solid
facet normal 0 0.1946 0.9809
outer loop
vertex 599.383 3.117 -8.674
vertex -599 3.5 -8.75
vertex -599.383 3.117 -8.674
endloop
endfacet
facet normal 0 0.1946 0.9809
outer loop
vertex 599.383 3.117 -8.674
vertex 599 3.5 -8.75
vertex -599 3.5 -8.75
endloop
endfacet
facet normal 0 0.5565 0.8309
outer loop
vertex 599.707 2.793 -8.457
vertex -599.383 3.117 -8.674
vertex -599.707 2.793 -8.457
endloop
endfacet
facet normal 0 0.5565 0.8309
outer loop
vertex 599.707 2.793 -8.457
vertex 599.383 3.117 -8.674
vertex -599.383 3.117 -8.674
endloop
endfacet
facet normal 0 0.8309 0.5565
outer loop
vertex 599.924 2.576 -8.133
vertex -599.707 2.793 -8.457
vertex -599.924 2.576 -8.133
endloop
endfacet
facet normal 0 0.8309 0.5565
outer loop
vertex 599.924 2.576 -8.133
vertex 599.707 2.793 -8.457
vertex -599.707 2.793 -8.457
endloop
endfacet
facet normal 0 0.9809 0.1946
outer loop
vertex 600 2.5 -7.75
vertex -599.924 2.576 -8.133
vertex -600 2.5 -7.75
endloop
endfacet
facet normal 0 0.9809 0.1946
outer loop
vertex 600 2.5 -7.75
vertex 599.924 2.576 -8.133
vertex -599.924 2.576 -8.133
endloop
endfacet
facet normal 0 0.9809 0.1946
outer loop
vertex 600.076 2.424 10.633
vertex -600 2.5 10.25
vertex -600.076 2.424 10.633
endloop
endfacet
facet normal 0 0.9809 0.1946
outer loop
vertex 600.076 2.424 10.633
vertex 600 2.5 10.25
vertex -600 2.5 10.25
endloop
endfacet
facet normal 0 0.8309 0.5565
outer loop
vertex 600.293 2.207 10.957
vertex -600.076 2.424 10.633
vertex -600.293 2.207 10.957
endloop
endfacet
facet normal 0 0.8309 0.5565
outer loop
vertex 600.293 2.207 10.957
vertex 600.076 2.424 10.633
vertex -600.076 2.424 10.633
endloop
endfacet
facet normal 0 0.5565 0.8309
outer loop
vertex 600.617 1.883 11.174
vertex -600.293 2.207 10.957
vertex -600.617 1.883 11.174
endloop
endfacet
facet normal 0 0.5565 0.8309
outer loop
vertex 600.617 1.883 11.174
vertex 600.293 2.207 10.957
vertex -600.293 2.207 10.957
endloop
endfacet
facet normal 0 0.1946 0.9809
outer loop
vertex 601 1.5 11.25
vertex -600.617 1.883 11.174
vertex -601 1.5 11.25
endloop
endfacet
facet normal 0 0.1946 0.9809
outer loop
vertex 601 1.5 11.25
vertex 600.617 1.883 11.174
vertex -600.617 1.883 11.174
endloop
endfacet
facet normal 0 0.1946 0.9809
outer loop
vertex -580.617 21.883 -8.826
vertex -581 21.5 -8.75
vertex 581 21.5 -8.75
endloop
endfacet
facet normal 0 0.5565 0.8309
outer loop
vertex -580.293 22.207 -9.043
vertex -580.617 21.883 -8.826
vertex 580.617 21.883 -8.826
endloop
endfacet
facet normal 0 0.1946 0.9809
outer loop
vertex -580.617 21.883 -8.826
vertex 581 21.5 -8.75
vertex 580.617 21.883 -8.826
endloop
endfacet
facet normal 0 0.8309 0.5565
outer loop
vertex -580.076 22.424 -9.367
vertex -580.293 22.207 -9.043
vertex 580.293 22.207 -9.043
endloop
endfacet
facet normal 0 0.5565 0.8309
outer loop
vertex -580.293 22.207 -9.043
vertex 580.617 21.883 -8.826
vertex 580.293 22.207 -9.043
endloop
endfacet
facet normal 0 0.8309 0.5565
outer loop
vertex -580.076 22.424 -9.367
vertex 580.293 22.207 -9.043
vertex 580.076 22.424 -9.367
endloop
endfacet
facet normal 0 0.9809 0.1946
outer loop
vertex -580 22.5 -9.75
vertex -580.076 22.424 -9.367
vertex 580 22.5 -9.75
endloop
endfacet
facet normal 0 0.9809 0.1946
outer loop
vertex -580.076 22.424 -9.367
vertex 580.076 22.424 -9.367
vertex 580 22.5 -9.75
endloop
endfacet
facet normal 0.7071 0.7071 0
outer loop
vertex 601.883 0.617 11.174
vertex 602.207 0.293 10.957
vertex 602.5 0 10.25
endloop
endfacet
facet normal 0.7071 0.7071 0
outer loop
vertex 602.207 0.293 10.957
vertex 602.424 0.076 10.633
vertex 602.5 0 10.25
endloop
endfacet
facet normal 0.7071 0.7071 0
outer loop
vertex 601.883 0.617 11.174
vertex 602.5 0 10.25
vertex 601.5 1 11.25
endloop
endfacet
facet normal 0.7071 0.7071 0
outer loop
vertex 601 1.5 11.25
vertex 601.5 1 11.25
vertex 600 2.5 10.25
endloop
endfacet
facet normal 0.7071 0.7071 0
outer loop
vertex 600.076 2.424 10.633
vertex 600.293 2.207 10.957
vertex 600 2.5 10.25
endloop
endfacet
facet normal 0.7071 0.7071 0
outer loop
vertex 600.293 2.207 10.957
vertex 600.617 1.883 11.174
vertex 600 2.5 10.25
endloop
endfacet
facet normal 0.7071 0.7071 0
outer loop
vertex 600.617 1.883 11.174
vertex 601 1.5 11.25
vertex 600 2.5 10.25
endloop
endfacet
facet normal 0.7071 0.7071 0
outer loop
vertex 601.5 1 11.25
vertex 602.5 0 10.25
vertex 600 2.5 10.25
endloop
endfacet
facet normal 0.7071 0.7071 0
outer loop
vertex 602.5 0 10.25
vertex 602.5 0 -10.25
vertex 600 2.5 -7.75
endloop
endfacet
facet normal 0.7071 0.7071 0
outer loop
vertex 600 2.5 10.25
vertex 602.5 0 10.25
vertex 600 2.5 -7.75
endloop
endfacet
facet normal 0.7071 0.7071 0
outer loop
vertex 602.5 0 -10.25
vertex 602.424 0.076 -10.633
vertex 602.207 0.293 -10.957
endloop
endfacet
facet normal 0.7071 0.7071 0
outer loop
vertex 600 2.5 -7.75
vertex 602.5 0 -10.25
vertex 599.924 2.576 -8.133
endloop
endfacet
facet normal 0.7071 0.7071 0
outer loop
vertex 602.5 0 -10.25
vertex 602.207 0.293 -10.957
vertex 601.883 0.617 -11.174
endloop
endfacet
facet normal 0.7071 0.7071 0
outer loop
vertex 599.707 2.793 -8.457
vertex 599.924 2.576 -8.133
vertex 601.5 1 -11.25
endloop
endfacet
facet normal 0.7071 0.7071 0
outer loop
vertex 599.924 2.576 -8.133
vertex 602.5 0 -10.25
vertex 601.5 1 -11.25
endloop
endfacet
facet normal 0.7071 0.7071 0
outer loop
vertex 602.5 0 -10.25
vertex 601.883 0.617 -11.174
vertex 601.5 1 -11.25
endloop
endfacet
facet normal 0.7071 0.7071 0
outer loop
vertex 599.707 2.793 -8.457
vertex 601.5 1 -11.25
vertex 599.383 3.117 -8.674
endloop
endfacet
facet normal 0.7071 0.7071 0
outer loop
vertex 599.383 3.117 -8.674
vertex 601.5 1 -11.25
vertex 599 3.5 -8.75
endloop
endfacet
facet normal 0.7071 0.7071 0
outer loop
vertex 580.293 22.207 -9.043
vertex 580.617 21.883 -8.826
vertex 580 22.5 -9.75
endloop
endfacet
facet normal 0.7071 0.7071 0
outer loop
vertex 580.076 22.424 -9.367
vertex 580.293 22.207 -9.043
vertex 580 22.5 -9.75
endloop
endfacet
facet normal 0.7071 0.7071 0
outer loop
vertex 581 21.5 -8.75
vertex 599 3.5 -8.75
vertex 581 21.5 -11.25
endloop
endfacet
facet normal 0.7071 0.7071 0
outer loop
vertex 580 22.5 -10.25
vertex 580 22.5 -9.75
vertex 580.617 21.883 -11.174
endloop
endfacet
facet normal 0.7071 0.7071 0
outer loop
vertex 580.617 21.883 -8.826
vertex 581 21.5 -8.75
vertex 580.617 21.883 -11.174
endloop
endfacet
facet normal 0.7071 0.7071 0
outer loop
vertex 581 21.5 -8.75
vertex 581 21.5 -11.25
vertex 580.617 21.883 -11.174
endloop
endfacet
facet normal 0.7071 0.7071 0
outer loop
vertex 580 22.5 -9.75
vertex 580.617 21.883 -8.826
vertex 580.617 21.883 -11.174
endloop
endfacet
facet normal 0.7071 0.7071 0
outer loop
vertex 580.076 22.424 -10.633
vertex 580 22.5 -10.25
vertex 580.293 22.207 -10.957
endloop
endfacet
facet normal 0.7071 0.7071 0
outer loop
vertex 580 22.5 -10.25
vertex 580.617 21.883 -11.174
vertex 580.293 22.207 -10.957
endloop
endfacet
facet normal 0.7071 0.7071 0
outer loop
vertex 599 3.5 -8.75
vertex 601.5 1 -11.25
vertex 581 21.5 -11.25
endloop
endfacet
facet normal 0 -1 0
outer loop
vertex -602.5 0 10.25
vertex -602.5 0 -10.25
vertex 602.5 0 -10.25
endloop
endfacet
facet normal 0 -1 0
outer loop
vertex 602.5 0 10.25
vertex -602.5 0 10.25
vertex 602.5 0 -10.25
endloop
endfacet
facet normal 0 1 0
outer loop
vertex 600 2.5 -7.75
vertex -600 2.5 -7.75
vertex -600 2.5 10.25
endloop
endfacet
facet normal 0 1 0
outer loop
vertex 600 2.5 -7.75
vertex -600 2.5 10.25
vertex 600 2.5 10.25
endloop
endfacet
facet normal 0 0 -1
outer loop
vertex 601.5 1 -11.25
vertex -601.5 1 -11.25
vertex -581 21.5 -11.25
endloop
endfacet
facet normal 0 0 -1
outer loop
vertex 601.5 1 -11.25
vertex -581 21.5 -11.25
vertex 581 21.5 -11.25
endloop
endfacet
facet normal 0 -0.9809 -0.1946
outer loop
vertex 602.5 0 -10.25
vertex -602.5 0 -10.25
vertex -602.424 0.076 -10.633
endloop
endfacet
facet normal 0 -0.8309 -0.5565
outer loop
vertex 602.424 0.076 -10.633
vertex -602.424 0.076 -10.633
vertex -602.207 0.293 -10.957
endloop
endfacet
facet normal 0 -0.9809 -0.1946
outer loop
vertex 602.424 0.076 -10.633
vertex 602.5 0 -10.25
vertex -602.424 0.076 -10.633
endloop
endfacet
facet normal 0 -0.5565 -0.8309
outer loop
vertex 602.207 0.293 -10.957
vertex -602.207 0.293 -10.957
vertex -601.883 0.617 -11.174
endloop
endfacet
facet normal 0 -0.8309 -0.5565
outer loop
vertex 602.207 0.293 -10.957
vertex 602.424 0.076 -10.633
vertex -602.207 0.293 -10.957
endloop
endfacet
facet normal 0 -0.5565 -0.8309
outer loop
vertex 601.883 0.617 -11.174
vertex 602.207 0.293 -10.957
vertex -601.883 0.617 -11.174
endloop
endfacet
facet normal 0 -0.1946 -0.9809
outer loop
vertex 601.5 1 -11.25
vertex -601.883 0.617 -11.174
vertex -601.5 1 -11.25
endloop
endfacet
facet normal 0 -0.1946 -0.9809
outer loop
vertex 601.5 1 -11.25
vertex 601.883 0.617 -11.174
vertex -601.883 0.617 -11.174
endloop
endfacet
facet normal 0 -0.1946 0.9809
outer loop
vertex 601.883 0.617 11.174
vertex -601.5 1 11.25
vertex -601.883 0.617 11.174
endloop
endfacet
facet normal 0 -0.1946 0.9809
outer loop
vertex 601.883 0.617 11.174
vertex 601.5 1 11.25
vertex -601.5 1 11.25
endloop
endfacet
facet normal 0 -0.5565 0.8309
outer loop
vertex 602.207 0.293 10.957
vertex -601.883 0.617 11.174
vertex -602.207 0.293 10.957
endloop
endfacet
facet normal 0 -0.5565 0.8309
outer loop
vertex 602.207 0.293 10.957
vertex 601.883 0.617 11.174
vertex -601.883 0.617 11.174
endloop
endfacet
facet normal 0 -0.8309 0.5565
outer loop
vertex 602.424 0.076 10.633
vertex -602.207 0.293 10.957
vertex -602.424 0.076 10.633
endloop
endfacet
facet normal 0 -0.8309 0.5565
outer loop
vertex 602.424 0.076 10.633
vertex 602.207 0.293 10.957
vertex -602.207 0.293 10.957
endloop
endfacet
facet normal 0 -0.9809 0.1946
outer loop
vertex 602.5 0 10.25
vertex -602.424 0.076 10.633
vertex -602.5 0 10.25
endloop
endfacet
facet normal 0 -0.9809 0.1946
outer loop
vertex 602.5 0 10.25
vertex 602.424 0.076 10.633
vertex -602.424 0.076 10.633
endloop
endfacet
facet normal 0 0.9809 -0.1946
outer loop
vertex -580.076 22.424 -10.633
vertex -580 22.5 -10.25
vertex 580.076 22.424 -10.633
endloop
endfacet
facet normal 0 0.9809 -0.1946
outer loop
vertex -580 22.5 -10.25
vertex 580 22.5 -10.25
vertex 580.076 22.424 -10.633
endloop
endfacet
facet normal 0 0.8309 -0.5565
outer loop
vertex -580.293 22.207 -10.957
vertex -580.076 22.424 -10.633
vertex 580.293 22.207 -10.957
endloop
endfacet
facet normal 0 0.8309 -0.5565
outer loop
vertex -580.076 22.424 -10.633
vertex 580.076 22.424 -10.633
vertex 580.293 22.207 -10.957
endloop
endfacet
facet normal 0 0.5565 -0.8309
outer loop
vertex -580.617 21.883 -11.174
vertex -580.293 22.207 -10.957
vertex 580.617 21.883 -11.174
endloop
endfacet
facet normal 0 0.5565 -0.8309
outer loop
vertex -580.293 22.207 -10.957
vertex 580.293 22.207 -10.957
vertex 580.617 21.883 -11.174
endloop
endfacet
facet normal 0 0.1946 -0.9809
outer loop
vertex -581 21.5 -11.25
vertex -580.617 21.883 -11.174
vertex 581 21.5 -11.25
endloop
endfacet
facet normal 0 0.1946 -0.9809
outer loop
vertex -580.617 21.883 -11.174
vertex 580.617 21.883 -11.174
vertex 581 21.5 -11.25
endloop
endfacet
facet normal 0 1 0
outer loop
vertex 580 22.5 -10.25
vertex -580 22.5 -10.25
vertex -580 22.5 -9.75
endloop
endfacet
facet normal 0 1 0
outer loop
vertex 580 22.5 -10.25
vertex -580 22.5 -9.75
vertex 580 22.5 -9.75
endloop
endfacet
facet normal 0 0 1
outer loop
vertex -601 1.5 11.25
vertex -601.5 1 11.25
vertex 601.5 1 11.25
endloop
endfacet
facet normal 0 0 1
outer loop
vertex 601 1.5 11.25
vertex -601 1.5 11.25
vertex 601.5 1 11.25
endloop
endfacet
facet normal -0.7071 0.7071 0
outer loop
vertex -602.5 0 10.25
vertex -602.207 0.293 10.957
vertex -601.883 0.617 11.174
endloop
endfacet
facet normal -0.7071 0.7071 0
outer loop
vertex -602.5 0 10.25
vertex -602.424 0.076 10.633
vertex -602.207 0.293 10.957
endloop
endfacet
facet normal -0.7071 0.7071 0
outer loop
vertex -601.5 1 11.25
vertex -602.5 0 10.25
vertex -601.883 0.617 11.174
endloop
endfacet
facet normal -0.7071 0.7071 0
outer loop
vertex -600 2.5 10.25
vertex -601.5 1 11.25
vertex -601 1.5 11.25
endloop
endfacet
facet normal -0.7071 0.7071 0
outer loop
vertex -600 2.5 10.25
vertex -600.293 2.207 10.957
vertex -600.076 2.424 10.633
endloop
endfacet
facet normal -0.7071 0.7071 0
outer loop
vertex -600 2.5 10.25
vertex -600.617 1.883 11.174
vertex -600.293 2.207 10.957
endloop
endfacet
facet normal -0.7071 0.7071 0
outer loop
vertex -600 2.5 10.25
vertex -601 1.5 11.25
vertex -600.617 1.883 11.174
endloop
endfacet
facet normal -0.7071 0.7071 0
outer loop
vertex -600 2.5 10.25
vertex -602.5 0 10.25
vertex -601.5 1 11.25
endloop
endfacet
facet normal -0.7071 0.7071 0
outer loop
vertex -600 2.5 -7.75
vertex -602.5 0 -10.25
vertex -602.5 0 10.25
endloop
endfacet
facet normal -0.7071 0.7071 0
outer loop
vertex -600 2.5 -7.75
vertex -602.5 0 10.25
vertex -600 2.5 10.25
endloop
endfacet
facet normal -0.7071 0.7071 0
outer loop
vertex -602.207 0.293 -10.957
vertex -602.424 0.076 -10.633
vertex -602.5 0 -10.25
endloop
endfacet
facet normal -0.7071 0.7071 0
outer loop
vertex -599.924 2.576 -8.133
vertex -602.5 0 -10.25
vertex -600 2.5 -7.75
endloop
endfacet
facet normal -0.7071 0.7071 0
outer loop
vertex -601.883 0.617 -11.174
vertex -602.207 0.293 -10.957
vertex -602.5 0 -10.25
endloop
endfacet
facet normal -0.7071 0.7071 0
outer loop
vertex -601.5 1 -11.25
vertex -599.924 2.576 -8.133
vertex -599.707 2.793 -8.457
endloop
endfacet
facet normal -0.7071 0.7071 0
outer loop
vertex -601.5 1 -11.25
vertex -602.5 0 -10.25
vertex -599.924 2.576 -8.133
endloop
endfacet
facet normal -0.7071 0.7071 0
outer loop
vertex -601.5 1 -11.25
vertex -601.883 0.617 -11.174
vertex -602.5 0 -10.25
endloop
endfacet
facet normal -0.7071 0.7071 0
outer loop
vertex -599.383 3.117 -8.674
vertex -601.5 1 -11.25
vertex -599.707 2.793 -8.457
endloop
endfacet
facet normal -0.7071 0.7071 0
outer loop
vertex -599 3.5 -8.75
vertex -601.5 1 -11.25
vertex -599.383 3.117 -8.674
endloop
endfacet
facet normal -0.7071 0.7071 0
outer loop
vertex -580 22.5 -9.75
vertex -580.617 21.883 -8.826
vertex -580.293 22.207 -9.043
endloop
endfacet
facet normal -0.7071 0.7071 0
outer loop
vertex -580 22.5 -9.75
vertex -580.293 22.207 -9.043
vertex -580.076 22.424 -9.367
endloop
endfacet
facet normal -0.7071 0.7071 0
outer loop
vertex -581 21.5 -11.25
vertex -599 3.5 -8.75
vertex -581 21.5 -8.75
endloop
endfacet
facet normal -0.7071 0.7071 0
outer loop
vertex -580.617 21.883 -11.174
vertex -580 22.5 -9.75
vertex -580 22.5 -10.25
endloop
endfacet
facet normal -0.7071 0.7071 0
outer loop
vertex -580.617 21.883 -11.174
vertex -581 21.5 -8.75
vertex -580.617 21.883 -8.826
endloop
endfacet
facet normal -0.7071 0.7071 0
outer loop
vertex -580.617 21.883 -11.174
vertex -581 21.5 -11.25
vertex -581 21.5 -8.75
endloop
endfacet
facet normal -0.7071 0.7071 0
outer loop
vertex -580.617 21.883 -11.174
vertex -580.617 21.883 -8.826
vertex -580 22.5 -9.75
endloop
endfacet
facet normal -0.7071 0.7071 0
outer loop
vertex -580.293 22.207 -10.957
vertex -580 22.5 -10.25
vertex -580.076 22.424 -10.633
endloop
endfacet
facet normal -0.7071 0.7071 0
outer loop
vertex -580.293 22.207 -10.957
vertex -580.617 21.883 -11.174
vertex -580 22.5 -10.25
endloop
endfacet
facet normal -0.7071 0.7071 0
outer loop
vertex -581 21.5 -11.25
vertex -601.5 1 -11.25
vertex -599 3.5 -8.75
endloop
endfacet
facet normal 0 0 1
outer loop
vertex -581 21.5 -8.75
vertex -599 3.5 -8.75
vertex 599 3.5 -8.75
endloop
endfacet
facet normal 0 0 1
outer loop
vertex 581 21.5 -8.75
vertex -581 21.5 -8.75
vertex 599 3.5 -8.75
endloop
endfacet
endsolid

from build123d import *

# Parameters (mm, degrees)
SKETCH1_W               = 1220
SKETCH1_H               = 22.5
BOSS_EXTRUDE1_DEPTH     = 2.5
SKETCH2_W               = 1220
SKETCH2_H               = 2.5
BOSS_EXTRUDE2_DEPTH     = 20
CUT_EXTRUDE1_DEPTH      = 611.742376129
CUT_EXTRUDE1_DEPTH_BACK = 25
FILLET2_R               = 1


with BuildPart() as part:
    # Sketch1 → Boss-Extrude1 (new body)
    with BuildSketch(Plane(origin=(0, 0, 0), x_dir=(1, 0, 0), z_dir=(0, 1, 0))):
        Rectangle(SKETCH1_W, SKETCH1_H)
    extrude(amount=BOSS_EXTRUDE1_DEPTH)

    # Sketch2 → Boss-Extrude2 (add)
    with BuildSketch(Plane(origin=(0, 2.5, 0), x_dir=(1, 0, 0), z_dir=(0, 1, 0))):
        with Locations((0, 10)):
            Rectangle(SKETCH2_W, SKETCH2_H)
    extrude(amount=BOSS_EXTRUDE2_DEPTH)

    # Sketch3 → Cut-Extrude1 (cut, two sides: drawn at the far end of the back side and taken through both)
    with BuildSketch(Plane.XY.offset(-8.75).offset(-CUT_EXTRUDE1_DEPTH_BACK)):
        Polygon((-610, 22.5), (-610, -7.5), (-580, 22.5), align=None)
        Polygon((610, 22.5), (610, -7.5), (580, 22.5), align=None)
    extrude(amount=CUT_EXTRUDE1_DEPTH + CUT_EXTRUDE1_DEPTH_BACK, mode=Mode.SUBTRACT)

    # Fillet2
    fillet2_edges = [part.edges().sort_by_distance(p)[0] for p in [
        (0, 22.5, -8.75),
        (0, 2.5, -8.75),
        (0, 0, 11.25),
        (0, 2.5, 11.25),
        (0, 22.5, -11.25),
        (0, 0, -11.25),
    ]]
    fillet(fillet2_edges, radius=FILLET2_R)


solid = part.part
